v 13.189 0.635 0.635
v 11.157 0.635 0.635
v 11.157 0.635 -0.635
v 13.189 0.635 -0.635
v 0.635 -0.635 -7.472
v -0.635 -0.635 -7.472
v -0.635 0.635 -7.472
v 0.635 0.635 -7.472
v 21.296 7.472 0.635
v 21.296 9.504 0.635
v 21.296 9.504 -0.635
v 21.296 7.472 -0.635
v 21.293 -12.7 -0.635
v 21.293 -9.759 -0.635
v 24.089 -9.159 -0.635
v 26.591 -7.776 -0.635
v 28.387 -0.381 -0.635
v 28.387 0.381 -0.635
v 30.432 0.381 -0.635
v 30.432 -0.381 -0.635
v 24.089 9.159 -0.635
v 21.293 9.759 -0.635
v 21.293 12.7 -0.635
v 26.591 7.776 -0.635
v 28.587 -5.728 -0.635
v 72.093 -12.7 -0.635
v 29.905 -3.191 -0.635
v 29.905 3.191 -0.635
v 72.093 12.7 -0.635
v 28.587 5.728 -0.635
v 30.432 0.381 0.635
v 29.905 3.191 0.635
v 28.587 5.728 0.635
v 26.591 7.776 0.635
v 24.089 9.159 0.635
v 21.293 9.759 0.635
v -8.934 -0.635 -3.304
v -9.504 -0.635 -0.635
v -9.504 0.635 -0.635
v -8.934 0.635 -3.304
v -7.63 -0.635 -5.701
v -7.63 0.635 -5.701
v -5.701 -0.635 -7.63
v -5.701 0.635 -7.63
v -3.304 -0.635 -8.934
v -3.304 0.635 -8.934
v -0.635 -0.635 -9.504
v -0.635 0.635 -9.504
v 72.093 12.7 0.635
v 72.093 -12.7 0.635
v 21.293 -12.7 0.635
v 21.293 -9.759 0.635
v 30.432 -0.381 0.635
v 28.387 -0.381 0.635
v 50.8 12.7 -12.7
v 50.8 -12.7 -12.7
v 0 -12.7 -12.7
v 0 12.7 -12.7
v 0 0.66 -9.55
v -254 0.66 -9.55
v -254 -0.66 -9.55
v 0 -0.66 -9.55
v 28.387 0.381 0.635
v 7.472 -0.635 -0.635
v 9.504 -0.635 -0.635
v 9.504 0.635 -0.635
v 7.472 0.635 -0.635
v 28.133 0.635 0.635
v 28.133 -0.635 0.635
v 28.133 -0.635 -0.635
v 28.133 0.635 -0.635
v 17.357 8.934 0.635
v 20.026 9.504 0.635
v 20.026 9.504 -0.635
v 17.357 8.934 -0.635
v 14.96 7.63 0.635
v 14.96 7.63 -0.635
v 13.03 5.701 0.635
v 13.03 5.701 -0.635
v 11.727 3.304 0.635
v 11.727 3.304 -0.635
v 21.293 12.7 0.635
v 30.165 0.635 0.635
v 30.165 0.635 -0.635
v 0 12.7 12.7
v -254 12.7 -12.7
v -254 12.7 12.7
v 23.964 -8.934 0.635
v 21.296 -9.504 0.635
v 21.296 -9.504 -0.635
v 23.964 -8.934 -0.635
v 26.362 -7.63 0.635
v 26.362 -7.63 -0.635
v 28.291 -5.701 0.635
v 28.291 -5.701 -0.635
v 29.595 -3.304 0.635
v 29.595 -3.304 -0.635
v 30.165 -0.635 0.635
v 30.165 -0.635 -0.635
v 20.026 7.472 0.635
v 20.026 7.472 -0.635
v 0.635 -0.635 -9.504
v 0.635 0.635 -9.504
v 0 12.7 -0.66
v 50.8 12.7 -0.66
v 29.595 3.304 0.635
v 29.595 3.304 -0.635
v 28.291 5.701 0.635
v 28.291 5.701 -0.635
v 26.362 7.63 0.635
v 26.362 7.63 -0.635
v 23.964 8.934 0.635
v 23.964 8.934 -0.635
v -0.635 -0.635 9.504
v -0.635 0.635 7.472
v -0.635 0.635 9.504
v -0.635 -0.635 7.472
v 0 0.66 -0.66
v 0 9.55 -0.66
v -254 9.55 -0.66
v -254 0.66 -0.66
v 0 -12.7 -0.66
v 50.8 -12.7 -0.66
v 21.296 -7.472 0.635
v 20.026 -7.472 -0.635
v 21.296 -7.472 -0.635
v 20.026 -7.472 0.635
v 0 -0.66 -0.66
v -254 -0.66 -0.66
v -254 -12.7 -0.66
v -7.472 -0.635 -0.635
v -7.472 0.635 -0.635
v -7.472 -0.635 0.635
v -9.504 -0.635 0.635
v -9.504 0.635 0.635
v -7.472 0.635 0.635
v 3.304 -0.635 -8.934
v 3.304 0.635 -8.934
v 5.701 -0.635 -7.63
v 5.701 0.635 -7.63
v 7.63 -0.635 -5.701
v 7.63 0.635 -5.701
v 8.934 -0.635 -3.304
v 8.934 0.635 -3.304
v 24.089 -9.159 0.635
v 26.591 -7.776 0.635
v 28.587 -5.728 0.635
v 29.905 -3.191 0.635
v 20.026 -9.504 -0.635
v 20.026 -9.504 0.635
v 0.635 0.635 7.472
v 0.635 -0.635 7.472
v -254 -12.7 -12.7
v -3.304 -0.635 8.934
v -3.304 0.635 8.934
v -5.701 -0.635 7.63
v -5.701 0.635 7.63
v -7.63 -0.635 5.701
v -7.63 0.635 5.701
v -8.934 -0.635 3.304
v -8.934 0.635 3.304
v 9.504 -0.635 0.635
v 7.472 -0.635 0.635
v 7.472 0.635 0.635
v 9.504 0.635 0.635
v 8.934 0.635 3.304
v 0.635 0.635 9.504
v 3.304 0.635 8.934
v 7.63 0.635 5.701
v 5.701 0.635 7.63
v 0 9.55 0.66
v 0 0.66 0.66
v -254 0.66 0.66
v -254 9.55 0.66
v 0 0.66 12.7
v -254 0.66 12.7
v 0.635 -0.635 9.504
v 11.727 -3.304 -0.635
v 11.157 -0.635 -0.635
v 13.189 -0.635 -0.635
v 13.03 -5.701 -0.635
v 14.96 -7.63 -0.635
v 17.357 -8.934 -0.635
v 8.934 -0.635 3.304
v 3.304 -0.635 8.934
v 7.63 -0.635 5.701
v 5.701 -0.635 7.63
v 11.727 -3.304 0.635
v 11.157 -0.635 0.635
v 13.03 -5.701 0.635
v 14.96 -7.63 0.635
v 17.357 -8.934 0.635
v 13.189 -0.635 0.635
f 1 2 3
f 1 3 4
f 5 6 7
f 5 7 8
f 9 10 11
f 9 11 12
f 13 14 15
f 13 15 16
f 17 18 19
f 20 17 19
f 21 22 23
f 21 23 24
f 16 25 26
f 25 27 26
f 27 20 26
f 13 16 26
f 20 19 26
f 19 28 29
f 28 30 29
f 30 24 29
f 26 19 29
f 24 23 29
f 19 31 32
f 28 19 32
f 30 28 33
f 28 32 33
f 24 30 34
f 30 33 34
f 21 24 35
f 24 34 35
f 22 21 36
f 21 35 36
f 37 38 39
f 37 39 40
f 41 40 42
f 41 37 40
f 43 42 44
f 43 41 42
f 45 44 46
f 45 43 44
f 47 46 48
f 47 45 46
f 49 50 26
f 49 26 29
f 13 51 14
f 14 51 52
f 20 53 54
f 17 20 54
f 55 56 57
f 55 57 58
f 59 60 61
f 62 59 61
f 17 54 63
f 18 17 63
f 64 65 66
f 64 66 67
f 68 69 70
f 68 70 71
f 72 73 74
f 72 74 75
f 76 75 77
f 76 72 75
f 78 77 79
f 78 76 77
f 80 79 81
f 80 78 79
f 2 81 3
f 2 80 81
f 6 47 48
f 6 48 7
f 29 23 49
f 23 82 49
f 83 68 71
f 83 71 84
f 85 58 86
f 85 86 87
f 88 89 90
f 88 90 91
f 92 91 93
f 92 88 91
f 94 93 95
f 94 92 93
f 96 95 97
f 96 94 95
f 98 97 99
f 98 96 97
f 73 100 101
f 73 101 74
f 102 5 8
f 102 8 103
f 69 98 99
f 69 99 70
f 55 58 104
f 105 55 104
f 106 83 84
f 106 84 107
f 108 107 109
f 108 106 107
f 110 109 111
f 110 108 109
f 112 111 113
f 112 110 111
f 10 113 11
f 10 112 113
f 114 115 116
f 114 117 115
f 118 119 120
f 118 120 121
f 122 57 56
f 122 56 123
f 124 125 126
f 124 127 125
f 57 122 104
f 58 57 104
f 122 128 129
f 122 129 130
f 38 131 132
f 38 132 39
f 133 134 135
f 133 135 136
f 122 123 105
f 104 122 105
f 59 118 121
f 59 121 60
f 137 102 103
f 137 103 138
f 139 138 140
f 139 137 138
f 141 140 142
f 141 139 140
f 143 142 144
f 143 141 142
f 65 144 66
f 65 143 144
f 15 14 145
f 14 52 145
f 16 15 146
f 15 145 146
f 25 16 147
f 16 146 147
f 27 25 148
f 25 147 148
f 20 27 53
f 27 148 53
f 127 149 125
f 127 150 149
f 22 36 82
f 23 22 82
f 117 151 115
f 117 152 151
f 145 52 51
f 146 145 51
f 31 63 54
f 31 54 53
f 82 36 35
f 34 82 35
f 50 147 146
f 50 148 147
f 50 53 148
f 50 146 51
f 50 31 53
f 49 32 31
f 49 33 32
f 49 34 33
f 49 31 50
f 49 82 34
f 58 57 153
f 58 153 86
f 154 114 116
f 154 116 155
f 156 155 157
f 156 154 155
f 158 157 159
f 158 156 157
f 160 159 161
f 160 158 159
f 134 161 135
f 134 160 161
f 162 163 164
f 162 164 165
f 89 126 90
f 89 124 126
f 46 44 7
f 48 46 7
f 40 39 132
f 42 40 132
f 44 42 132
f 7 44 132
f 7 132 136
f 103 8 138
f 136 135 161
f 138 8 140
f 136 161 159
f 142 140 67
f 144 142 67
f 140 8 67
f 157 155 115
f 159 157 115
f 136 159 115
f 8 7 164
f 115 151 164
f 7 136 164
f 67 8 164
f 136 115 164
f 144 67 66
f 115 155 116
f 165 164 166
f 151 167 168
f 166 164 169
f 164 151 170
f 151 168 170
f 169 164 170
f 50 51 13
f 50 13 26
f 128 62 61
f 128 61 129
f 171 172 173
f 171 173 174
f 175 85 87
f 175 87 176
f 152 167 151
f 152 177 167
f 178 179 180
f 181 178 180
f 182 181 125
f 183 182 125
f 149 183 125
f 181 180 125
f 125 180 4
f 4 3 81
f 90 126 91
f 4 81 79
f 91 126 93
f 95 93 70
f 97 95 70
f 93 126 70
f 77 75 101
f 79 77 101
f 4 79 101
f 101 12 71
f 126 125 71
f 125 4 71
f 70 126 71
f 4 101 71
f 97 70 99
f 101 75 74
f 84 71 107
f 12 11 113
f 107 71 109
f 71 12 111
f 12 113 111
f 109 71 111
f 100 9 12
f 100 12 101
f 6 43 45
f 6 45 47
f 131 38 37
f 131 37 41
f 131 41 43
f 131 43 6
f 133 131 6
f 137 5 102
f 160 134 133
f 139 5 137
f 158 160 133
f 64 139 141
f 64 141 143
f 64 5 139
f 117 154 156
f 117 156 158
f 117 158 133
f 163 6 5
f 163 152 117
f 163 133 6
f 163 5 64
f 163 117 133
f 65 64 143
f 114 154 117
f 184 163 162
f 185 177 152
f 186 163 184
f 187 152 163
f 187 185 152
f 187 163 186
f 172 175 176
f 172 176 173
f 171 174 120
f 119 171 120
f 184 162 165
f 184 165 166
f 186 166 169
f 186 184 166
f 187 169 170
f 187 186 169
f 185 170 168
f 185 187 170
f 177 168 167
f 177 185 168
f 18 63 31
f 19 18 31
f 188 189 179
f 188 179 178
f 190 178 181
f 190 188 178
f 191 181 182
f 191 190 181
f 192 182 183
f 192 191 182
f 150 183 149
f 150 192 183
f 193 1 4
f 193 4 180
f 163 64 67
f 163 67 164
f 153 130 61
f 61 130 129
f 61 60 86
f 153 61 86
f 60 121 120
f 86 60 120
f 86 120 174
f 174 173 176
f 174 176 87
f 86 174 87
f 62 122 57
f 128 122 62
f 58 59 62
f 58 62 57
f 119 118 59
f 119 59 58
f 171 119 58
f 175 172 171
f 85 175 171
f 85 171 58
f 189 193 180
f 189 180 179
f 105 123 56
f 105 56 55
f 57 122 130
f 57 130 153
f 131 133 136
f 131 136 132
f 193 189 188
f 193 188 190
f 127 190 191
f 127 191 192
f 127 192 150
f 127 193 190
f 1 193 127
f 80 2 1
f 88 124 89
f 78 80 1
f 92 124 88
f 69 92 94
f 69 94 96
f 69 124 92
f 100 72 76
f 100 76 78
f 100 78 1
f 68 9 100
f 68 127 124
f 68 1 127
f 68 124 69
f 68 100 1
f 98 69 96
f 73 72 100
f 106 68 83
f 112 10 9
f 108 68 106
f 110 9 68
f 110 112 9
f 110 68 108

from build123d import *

# Parameters (mm, degrees)
F1_DEPTH   = 0.635
F3_DEPTH   = 0.635
F5_DEPTH   = 254
F6_W       = 25.4
F6_H       = 12.0396
F7_DEPTH   = 50.8
F8_W       = 50.8
F8_H       = 25.4
F9_DEPTH   = 0.635
F10_OFFSET = 0.254


with BuildPart() as f1:
    # F0 (on Front) → F1 (new body, symmetric)
    with BuildSketch(Plane.XZ):
        with BuildLine():
            Line((-0.635, 7.4718097624), (-0.635, 9.5038097624))
            ThreePointArc((-0.635, 9.5038097624), (-6.7351920908, 6.7351920908), (-9.5038097624, 0.635))
            Line((-9.5038097624, 0.635), (-7.4718097624, 0.635))
            Line((-7.4718097624, 0.635), (-7.4718097624, -0.635))
            Line((-7.4718097624, -0.635), (-9.5038097624, -0.635))
            ThreePointArc((-9.5038097624, -0.635), (-6.7351920908, -6.7351920908), (-0.635, -9.5038097624))
            Line((-0.635, -9.5038097624), (-0.635, -7.4718097624))
            Line((-0.635, -7.4718097624), (0.635, -7.4718097624))
            Line((0.635, -7.4718097624), (0.635, -9.5038097624))
            ThreePointArc((0.635, -9.5038097624), (6.7351920908, -6.7351920908), (9.5038097624, -0.635))
            Line((9.5038097624, -0.635), (7.4718097624, -0.635))
            Line((7.4718097624, -0.635), (7.4718097624, 0.635))
            Line((7.4718097624, 0.635), (9.5038097624, 0.635))
            ThreePointArc((9.5038097624, 0.635), (6.7351920908, 6.7351920908), (0.635, 9.5038097624))
            Line((0.635, 9.5038097624), (0.635, 7.4718097624))
            Line((0.635, 7.4718097624), (-0.635, 7.4718097624))
        make_face()
    extrude(amount=F1_DEPTH, both=True)


with BuildPart() as f3:
    # F2 (on Top) → F3 (new body, symmetric)
    with BuildSketch(Plane.XY):
        with BuildLine():
            Line((21.2958350215, -7.4718097624), (21.2958350215, -9.5038097624))
            ThreePointArc((21.2958350215, -9.5038097624), (27.3960271123, -6.7351920908), (30.1646447839, -0.635))
            Line((30.1646447839, -0.635), (28.1326447839, -0.635))
            Line((28.1326447839, -0.635), (28.1326447839, 0.635))
            Line((28.1326447839, 0.635), (30.1646447839, 0.635))
            ThreePointArc((30.1646447839, 0.635), (27.3960271123, 6.7351920908), (21.2958350215, 9.5038097624))
            Line((21.2958350215, 9.5038097624), (21.2958350215, 7.4718097624))
            Line((21.2958350215, 7.4718097624), (20.0258350215, 7.4718097624))
            Line((20.0258350215, 7.4718097624), (20.0258350215, 9.5038097624))
            ThreePointArc((20.0258350215, 9.5038097624), (13.9256429307, 6.7351920908), (11.1570252591, 0.635))
            Line((11.1570252591, 0.635), (13.1890252591, 0.635))
            Line((13.1890252591, 0.635), (13.1890252591, -0.635))
            Line((13.1890252591, -0.635), (11.1570252591, -0.635))
            ThreePointArc((11.1570252591, -0.635), (13.9256429307, -6.7351920908), (20.0258350215, -9.5038097624))
            Line((20.0258350215, -9.5038097624), (20.0258350215, -7.4718097624))
            Line((20.0258350215, -7.4718097624), (21.2958350215, -7.4718097624))
        make_face()
    extrude(amount=F3_DEPTH, both=True)


with BuildPart() as f5:
    # F4 (on Right) → F5 (new body)
    with BuildSketch(Plane.YZ):
        Polygon((-12.7, -12.7), (12.7, -12.7), (12.7, 12.7), (0.6604, 12.7), (0.6604, 9.5504), (0.6604, 0.6604), (9.5504, 0.6604), (9.5504, -0.6604), (0.6604, -0.6604), (0.6604, -9.5504), (-0.6604, -9.5504), (-0.6604, -0.6604), (-9.5504, -0.6604), (-12.7, -0.6604), align=None)
    extrude(amount=-F5_DEPTH)


with BuildPart() as f7:
    # F6 (on face) → F7 (new body)
    with BuildSketch(Plane.YZ):
        with Locations((0, -6.6802)):
            Rectangle(F6_W, F6_H)
    extrude(amount=F7_DEPTH)


with BuildPart() as f9:
    # F8 (on Top) → F9 (new body, symmetric)
    with BuildSketch(Plane.XY):
        with Locations((46.6932952404, 0)):
            Rectangle(F8_W, F8_H)
    extrude(amount=F9_DEPTH, both=True)

    # F10: cut F3, made larger all round first
    f10_tool = offset(f3.part, amount=F10_OFFSET, kind=Kind.INTERSECTION, mode=Mode.PRIVATE)
    add(f10_tool, mode=Mode.SUBTRACT)


solid = Compound([f1.part, f3.part, f5.part, f7.part, f9.part])
